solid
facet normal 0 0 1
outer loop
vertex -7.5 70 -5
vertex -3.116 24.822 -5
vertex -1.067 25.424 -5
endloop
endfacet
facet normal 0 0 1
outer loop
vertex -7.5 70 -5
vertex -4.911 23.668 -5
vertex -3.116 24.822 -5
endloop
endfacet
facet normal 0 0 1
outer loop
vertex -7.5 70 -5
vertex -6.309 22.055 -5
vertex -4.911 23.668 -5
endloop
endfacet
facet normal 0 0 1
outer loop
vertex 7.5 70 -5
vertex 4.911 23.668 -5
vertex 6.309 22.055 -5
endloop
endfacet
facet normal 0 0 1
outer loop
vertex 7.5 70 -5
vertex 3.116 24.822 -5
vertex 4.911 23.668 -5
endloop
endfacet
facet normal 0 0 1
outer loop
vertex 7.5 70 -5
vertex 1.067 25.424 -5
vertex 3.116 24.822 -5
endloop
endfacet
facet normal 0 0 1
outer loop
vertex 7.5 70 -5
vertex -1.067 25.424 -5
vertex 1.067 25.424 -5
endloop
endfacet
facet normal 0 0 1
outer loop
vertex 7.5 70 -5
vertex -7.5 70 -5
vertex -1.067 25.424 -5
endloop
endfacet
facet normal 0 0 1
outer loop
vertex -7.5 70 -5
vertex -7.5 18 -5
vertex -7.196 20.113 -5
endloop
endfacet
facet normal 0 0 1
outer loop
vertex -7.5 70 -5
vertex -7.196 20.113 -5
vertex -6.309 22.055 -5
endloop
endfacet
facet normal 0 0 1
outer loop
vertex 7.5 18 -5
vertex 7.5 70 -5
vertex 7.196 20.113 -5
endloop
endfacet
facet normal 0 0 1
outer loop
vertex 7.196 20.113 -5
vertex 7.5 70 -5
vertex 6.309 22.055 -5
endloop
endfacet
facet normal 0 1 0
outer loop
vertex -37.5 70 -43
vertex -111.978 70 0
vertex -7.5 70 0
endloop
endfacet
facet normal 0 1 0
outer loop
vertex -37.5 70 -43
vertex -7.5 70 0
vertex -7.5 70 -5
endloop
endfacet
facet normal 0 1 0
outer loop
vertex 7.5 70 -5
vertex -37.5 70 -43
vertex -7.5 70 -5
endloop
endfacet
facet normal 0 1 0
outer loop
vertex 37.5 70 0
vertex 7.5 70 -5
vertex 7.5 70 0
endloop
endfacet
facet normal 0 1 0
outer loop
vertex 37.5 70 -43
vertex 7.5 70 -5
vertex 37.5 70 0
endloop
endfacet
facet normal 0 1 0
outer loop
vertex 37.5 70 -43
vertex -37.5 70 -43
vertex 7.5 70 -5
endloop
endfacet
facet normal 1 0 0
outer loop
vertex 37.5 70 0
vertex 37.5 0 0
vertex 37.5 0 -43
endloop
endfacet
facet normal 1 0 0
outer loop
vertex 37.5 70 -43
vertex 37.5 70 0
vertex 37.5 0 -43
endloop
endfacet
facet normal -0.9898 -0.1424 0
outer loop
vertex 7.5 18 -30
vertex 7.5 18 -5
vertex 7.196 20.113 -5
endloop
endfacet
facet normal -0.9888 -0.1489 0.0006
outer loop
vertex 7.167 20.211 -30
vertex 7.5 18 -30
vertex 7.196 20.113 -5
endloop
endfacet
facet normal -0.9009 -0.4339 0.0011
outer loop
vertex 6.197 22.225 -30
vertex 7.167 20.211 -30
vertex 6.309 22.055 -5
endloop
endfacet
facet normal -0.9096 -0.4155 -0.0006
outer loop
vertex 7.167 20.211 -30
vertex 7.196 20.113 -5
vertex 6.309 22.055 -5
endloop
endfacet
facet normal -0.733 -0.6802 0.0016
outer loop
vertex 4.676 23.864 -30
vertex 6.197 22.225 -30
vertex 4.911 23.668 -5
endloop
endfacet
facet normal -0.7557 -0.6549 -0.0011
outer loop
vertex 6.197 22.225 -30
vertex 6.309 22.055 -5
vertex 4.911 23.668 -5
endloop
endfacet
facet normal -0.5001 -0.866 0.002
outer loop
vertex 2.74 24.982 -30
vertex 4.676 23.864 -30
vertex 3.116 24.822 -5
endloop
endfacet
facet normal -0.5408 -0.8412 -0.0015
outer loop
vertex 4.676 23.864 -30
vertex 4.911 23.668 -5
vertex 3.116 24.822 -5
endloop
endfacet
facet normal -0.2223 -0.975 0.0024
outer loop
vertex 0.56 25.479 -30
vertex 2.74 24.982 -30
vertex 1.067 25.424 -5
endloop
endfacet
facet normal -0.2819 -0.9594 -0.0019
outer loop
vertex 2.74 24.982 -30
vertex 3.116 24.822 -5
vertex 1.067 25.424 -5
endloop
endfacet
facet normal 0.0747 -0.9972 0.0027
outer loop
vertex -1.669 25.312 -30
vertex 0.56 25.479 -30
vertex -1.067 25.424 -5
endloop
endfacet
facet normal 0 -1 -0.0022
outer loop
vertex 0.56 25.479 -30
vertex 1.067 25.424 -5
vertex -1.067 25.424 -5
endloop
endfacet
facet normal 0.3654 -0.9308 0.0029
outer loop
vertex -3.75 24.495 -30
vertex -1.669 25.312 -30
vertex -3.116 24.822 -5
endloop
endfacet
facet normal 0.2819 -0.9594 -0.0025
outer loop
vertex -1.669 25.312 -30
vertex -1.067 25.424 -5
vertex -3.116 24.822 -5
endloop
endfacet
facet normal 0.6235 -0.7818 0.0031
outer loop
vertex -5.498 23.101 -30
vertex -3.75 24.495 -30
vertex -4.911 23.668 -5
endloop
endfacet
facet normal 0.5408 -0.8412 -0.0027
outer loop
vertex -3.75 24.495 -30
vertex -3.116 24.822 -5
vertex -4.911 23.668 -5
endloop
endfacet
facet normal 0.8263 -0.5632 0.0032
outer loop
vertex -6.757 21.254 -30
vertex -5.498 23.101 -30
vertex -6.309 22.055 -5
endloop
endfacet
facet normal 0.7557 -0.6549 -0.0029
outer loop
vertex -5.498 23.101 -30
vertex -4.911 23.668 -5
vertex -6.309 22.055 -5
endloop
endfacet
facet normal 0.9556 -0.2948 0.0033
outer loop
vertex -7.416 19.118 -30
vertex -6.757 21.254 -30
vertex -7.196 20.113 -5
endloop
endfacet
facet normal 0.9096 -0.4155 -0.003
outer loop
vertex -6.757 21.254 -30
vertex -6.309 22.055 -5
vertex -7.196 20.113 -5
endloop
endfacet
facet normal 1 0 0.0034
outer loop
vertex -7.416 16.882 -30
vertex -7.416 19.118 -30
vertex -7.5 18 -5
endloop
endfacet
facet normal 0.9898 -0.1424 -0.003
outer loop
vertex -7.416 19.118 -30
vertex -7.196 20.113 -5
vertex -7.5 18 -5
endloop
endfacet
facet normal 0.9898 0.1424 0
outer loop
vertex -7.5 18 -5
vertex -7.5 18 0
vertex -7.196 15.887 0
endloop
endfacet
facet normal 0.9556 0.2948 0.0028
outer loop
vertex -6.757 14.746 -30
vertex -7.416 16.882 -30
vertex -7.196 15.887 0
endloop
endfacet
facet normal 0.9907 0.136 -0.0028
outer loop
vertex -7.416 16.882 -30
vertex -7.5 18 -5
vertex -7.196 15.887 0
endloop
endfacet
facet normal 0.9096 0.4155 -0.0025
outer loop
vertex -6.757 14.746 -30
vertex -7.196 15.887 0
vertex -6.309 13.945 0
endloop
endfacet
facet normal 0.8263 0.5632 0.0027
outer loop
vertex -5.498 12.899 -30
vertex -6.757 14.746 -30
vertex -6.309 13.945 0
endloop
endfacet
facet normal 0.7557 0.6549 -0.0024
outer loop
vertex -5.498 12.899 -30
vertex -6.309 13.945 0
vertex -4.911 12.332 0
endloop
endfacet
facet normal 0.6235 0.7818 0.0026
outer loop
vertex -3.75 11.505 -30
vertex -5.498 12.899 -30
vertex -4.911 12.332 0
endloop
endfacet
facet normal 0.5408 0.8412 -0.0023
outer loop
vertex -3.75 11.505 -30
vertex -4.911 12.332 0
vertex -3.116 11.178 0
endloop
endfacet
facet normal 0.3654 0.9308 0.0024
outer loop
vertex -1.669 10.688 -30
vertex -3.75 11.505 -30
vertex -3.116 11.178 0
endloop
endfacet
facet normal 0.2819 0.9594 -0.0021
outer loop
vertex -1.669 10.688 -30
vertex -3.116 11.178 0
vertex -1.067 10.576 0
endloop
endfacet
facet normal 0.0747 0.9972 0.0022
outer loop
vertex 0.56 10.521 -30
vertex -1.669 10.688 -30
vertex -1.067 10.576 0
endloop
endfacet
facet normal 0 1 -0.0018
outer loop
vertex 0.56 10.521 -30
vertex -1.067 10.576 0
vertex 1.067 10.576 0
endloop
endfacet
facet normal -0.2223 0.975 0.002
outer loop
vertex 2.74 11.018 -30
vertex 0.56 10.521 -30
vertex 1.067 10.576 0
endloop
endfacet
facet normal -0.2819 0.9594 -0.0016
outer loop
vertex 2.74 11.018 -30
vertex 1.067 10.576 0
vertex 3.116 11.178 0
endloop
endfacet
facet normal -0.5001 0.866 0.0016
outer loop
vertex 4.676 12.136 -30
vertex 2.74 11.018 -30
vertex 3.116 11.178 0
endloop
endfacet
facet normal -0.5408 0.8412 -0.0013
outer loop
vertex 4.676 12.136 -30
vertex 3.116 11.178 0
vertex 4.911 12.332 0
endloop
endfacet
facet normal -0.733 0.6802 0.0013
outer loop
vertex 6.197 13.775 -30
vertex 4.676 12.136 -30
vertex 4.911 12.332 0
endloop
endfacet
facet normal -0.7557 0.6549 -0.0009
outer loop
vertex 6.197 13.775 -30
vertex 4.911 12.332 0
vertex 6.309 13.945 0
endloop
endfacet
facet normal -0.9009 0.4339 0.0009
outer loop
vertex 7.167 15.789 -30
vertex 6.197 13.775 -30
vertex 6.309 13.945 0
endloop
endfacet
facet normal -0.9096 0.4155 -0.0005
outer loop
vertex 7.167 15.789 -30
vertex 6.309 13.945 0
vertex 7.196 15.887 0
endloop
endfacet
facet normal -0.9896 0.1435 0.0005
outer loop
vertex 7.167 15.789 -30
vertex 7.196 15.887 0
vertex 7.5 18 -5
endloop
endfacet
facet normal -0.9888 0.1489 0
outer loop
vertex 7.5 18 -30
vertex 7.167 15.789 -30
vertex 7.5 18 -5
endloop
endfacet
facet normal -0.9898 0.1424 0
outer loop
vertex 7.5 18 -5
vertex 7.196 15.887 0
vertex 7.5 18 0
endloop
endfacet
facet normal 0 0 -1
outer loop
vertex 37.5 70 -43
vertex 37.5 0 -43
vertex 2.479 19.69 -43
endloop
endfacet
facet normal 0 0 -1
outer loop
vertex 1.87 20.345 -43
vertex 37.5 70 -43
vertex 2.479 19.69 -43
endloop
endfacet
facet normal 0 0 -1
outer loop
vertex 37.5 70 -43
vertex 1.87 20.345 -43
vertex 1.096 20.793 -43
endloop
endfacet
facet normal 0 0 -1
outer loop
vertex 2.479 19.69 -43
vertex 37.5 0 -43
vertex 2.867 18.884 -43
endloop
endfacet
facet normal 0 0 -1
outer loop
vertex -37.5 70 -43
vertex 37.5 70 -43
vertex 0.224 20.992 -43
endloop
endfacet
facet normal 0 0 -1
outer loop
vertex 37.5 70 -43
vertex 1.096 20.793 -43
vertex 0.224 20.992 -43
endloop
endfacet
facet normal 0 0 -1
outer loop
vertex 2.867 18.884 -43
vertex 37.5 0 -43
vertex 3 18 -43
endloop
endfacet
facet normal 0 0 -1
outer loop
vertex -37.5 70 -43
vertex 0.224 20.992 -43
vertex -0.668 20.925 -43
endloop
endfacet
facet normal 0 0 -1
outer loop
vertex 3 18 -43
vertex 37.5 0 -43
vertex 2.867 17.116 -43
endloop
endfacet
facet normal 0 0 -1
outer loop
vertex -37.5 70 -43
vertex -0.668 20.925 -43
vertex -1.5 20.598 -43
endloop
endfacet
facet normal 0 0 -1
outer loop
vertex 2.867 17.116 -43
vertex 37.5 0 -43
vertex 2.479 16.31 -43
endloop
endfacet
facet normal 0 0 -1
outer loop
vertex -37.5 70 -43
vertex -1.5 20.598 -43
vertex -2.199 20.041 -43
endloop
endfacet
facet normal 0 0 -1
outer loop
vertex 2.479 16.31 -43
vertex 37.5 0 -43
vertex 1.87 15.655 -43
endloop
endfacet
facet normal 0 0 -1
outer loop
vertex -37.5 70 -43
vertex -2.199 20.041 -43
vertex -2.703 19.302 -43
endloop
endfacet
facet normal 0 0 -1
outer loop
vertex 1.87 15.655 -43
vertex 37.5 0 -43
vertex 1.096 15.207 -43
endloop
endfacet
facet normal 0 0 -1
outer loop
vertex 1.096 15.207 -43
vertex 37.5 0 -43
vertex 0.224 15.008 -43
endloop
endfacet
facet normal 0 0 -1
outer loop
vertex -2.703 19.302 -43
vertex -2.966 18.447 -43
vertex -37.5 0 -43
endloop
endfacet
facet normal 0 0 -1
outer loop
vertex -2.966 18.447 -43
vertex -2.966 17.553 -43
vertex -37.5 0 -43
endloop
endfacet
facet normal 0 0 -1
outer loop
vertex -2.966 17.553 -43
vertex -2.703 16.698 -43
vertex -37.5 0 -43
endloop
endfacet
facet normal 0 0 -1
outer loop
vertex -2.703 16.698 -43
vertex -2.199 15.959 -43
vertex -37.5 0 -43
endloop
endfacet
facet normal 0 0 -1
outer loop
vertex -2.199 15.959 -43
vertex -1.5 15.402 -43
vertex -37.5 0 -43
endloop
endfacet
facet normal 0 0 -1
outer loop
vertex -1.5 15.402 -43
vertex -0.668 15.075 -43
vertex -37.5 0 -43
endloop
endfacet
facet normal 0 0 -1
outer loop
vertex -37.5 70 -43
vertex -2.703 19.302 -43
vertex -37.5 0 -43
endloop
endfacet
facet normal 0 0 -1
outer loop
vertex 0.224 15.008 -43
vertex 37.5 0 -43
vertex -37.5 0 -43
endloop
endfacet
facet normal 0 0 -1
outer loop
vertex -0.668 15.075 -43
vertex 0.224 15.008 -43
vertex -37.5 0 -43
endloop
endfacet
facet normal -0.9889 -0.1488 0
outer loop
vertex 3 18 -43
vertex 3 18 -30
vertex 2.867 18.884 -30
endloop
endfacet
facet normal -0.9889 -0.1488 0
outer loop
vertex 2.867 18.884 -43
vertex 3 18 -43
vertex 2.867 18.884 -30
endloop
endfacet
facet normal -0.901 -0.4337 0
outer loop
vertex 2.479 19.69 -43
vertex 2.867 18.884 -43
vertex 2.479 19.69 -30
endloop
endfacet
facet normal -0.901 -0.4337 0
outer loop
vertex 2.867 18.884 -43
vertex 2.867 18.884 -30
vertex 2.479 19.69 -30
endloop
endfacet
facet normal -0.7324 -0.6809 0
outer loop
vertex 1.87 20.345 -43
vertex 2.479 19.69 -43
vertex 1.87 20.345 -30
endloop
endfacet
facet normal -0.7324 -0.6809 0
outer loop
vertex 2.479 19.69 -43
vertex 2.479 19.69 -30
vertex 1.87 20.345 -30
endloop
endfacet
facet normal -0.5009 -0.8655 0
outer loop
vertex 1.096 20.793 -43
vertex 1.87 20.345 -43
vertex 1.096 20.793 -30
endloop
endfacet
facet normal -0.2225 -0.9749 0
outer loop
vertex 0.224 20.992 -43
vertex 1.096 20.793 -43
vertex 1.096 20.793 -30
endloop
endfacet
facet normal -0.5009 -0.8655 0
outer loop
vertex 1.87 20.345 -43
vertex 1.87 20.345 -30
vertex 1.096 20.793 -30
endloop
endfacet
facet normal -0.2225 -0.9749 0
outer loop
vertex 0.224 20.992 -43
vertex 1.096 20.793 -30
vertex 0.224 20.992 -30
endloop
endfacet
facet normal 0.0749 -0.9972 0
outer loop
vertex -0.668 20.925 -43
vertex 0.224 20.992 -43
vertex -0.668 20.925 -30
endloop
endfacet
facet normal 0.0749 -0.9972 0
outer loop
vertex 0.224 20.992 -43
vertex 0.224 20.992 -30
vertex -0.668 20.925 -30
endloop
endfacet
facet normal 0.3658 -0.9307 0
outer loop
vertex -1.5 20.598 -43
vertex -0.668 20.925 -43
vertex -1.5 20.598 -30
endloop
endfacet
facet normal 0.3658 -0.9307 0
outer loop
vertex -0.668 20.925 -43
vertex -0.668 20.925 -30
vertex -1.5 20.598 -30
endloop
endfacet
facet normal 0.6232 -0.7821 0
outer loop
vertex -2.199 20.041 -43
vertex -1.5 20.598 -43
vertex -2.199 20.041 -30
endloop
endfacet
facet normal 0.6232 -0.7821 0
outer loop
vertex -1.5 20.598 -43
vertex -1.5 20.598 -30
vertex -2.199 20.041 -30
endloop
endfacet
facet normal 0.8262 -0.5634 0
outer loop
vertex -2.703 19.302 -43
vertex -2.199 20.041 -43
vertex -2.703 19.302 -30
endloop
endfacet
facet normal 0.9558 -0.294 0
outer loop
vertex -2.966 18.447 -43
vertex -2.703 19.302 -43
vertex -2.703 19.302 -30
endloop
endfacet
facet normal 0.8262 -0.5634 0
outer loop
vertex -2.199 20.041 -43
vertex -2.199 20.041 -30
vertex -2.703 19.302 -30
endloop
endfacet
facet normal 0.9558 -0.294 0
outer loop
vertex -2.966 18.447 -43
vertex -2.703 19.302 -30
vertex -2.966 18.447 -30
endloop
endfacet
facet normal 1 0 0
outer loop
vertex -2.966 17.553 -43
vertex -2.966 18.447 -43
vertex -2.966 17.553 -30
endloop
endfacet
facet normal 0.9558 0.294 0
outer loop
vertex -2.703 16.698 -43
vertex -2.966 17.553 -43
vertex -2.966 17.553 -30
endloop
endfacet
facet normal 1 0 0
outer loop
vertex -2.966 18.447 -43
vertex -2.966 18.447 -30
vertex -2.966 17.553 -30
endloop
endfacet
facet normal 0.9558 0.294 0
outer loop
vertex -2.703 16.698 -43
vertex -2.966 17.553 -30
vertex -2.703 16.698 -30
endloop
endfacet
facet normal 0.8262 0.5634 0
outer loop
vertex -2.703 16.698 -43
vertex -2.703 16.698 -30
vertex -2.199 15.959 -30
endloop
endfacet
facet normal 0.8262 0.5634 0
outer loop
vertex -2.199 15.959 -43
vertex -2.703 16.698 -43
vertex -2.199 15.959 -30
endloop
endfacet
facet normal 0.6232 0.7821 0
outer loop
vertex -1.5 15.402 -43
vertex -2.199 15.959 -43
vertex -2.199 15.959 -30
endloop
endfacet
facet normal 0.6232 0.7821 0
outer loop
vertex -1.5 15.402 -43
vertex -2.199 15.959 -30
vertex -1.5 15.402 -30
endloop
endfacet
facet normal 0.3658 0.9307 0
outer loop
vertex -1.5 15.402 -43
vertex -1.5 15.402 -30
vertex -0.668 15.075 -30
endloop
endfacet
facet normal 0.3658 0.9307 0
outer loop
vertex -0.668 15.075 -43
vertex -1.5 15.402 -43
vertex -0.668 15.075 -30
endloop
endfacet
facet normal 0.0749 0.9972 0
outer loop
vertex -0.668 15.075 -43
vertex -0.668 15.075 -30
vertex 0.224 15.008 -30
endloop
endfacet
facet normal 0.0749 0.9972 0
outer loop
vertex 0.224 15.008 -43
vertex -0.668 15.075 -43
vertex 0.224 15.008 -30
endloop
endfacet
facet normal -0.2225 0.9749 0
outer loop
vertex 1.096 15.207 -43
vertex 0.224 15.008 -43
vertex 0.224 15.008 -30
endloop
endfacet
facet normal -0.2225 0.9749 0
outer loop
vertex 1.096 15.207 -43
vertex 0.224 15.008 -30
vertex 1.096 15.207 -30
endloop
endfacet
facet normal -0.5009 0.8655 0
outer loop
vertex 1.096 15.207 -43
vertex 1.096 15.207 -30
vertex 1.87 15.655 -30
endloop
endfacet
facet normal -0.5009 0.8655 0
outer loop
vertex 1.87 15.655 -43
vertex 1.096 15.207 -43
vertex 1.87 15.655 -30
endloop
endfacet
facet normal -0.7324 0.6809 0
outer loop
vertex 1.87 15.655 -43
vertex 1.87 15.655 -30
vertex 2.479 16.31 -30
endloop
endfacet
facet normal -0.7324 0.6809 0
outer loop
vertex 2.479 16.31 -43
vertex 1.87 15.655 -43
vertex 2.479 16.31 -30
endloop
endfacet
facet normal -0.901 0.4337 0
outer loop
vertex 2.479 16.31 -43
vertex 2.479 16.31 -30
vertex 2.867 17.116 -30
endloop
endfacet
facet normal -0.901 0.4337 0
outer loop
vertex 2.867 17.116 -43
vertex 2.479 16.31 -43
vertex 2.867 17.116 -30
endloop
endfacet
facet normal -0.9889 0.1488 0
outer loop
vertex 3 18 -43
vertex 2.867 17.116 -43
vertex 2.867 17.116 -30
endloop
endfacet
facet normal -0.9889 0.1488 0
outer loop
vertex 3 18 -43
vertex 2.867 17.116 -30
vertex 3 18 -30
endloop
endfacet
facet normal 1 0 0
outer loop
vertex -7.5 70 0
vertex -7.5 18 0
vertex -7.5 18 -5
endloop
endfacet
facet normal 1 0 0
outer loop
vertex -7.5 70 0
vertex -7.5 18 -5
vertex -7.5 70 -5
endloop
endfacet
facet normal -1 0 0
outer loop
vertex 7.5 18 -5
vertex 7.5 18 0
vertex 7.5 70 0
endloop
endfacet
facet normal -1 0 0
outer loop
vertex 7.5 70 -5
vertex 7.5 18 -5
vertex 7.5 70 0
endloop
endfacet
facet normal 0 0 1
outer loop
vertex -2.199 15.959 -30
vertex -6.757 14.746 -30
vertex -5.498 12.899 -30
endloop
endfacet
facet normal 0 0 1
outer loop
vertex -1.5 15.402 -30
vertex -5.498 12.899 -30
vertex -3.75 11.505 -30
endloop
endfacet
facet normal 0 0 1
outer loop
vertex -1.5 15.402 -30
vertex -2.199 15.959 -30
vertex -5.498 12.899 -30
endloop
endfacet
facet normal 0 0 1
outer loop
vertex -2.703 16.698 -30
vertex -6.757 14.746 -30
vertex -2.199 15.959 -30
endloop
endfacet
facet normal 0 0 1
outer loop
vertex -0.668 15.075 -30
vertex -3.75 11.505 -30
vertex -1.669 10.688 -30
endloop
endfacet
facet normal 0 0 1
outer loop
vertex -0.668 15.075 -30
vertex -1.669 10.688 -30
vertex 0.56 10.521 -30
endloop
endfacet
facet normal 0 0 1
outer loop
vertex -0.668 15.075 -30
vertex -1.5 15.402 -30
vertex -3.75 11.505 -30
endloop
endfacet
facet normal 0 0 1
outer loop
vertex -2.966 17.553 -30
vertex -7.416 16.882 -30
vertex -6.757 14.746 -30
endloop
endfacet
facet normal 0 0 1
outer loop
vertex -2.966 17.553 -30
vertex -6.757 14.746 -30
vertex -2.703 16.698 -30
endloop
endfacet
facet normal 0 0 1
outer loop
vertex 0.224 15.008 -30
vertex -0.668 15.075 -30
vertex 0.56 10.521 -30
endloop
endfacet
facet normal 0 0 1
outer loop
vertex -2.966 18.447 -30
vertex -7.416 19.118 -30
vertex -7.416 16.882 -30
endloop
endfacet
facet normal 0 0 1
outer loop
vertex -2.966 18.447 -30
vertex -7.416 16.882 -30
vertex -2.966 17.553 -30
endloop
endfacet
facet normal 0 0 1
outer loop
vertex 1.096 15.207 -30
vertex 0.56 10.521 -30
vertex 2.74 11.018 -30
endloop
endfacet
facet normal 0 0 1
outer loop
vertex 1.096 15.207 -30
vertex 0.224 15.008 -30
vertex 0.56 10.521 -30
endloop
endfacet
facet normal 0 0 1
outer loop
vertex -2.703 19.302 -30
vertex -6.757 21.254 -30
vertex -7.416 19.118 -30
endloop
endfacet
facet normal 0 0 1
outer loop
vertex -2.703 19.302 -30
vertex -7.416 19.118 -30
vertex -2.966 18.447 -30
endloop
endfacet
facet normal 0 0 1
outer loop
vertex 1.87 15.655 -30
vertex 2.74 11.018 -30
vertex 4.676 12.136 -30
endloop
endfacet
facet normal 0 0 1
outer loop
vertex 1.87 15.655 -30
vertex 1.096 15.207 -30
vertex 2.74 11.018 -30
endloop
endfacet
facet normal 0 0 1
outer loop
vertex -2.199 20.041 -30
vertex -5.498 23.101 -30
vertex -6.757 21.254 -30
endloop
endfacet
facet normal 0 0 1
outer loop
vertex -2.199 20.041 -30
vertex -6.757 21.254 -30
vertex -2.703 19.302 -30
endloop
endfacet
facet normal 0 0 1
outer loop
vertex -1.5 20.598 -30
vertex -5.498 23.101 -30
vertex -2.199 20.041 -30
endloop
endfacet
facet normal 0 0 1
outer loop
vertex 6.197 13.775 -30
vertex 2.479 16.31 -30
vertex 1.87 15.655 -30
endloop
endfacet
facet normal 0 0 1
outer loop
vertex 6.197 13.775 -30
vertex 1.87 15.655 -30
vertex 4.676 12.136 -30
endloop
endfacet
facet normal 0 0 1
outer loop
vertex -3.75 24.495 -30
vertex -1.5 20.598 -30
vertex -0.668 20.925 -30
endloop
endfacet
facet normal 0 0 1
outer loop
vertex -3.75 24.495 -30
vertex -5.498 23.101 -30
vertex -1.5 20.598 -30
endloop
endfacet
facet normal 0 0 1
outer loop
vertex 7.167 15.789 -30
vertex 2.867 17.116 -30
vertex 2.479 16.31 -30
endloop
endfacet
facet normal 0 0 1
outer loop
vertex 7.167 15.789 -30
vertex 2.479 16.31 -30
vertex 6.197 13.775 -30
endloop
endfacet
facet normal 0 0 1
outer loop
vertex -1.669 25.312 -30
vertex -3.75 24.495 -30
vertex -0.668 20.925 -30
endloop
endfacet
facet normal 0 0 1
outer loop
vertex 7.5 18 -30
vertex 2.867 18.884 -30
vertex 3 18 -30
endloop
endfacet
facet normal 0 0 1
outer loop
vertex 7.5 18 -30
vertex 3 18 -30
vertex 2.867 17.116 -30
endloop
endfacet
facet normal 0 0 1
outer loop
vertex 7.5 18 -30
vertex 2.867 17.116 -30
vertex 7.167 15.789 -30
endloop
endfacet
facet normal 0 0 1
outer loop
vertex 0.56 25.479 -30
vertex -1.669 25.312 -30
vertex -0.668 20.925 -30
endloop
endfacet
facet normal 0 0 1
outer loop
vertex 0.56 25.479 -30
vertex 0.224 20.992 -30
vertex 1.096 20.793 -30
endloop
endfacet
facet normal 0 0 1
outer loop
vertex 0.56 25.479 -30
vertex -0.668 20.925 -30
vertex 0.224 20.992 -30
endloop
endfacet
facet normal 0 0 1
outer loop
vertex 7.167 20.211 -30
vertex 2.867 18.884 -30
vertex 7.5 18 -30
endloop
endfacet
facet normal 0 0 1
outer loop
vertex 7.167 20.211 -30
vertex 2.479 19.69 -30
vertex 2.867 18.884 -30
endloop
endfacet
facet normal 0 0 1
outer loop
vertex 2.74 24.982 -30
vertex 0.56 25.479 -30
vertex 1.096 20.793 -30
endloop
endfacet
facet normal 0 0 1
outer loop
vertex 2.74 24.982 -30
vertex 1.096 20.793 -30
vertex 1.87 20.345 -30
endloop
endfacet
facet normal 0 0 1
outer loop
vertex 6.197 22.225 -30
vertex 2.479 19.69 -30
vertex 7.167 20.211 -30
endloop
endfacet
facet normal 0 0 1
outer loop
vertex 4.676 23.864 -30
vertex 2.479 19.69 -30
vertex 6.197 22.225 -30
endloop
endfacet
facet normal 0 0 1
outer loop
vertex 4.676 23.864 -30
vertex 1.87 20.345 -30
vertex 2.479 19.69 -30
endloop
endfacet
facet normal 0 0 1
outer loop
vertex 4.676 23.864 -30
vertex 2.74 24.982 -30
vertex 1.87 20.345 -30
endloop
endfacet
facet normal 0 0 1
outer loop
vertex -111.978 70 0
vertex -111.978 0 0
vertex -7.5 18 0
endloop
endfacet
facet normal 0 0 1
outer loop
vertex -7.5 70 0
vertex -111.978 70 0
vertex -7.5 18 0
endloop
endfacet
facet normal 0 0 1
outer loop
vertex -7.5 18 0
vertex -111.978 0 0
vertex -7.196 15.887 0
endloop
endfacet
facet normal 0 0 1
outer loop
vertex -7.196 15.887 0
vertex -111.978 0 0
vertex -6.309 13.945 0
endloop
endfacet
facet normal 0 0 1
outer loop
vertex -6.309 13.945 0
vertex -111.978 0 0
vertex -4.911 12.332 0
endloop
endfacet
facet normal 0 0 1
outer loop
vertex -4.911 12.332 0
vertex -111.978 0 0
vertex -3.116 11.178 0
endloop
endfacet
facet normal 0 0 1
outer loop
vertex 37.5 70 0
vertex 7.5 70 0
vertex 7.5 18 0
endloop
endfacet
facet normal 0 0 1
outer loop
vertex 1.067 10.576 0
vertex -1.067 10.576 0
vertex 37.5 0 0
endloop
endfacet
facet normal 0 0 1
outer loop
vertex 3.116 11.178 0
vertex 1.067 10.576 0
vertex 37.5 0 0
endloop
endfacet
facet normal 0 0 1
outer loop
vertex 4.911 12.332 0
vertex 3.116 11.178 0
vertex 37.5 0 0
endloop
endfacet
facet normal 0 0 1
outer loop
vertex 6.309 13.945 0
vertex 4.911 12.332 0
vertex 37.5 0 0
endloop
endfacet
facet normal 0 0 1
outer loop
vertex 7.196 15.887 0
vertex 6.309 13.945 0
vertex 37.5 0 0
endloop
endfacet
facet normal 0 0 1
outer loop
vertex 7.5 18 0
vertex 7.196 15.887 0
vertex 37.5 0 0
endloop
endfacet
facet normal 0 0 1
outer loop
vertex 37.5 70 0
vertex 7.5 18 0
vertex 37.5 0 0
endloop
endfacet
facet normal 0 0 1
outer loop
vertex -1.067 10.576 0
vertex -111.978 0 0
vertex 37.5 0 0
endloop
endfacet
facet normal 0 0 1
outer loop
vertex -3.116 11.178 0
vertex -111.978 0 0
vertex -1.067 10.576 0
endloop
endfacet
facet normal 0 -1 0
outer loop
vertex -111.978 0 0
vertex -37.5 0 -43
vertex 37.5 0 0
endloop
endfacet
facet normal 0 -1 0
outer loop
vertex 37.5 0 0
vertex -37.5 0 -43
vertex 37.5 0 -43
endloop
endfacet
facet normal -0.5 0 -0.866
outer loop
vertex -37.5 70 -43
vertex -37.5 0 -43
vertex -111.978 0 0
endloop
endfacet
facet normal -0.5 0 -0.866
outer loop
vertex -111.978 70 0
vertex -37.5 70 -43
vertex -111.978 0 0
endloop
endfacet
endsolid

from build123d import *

# Parameters (mm, degrees)
BOSS_EXTRUDE1_DEPTH     = 70
SKETCH3_R               = 3
CUT_EXTRUDE1_DEPTH      = 44
SKETCH7_R               = 7.5
CUT_EXTRUDE3_DEPTH      = 1
CUT_EXTRUDE3_DEPTH_BACK = 30
SKETCH5_W               = 15
SKETCH5_H               = 52
CUT_EXTRUDE2_DEPTH      = 5


with BuildPart() as part:
    # Sketch1 → Boss-Extrude1 (new body)
    with BuildSketch(Plane(origin=(0, 0, 0), x_dir=(1, 0, 0), z_dir=(0, 1, 0))):
        Polygon((-111.978184725, 0), (37.5, 0), (37.5, 43), (-37.5, 43), align=None)
    extrude(amount=BOSS_EXTRUDE1_DEPTH)

    # Sketch3 → Cut-Extrude1 (cut, through all)
    with BuildSketch(Plane.XY):
        with Locations((0, 18)):
            Circle(SKETCH3_R)
    extrude(amount=-CUT_EXTRUDE1_DEPTH, mode=Mode.SUBTRACT)

    # Sketch7 → Cut-Extrude3 (cut, two sides)
    with BuildSketch(Plane.XY) as cut_extrude3_sk:
        with Locations((0, 18)):
            Circle(SKETCH7_R)
    extrude(amount=CUT_EXTRUDE3_DEPTH, mode=Mode.SUBTRACT)
    extrude(cut_extrude3_sk.sketch, amount=-CUT_EXTRUDE3_DEPTH_BACK, mode=Mode.SUBTRACT)

    # Sketch5 → Cut-Extrude2 (cut)
    with BuildSketch(Plane.XY):
        with Locations((0, 44)):
            Rectangle(SKETCH5_W, SKETCH5_H)
    extrude(amount=-CUT_EXTRUDE2_DEPTH, mode=Mode.SUBTRACT)


solid = part.part
